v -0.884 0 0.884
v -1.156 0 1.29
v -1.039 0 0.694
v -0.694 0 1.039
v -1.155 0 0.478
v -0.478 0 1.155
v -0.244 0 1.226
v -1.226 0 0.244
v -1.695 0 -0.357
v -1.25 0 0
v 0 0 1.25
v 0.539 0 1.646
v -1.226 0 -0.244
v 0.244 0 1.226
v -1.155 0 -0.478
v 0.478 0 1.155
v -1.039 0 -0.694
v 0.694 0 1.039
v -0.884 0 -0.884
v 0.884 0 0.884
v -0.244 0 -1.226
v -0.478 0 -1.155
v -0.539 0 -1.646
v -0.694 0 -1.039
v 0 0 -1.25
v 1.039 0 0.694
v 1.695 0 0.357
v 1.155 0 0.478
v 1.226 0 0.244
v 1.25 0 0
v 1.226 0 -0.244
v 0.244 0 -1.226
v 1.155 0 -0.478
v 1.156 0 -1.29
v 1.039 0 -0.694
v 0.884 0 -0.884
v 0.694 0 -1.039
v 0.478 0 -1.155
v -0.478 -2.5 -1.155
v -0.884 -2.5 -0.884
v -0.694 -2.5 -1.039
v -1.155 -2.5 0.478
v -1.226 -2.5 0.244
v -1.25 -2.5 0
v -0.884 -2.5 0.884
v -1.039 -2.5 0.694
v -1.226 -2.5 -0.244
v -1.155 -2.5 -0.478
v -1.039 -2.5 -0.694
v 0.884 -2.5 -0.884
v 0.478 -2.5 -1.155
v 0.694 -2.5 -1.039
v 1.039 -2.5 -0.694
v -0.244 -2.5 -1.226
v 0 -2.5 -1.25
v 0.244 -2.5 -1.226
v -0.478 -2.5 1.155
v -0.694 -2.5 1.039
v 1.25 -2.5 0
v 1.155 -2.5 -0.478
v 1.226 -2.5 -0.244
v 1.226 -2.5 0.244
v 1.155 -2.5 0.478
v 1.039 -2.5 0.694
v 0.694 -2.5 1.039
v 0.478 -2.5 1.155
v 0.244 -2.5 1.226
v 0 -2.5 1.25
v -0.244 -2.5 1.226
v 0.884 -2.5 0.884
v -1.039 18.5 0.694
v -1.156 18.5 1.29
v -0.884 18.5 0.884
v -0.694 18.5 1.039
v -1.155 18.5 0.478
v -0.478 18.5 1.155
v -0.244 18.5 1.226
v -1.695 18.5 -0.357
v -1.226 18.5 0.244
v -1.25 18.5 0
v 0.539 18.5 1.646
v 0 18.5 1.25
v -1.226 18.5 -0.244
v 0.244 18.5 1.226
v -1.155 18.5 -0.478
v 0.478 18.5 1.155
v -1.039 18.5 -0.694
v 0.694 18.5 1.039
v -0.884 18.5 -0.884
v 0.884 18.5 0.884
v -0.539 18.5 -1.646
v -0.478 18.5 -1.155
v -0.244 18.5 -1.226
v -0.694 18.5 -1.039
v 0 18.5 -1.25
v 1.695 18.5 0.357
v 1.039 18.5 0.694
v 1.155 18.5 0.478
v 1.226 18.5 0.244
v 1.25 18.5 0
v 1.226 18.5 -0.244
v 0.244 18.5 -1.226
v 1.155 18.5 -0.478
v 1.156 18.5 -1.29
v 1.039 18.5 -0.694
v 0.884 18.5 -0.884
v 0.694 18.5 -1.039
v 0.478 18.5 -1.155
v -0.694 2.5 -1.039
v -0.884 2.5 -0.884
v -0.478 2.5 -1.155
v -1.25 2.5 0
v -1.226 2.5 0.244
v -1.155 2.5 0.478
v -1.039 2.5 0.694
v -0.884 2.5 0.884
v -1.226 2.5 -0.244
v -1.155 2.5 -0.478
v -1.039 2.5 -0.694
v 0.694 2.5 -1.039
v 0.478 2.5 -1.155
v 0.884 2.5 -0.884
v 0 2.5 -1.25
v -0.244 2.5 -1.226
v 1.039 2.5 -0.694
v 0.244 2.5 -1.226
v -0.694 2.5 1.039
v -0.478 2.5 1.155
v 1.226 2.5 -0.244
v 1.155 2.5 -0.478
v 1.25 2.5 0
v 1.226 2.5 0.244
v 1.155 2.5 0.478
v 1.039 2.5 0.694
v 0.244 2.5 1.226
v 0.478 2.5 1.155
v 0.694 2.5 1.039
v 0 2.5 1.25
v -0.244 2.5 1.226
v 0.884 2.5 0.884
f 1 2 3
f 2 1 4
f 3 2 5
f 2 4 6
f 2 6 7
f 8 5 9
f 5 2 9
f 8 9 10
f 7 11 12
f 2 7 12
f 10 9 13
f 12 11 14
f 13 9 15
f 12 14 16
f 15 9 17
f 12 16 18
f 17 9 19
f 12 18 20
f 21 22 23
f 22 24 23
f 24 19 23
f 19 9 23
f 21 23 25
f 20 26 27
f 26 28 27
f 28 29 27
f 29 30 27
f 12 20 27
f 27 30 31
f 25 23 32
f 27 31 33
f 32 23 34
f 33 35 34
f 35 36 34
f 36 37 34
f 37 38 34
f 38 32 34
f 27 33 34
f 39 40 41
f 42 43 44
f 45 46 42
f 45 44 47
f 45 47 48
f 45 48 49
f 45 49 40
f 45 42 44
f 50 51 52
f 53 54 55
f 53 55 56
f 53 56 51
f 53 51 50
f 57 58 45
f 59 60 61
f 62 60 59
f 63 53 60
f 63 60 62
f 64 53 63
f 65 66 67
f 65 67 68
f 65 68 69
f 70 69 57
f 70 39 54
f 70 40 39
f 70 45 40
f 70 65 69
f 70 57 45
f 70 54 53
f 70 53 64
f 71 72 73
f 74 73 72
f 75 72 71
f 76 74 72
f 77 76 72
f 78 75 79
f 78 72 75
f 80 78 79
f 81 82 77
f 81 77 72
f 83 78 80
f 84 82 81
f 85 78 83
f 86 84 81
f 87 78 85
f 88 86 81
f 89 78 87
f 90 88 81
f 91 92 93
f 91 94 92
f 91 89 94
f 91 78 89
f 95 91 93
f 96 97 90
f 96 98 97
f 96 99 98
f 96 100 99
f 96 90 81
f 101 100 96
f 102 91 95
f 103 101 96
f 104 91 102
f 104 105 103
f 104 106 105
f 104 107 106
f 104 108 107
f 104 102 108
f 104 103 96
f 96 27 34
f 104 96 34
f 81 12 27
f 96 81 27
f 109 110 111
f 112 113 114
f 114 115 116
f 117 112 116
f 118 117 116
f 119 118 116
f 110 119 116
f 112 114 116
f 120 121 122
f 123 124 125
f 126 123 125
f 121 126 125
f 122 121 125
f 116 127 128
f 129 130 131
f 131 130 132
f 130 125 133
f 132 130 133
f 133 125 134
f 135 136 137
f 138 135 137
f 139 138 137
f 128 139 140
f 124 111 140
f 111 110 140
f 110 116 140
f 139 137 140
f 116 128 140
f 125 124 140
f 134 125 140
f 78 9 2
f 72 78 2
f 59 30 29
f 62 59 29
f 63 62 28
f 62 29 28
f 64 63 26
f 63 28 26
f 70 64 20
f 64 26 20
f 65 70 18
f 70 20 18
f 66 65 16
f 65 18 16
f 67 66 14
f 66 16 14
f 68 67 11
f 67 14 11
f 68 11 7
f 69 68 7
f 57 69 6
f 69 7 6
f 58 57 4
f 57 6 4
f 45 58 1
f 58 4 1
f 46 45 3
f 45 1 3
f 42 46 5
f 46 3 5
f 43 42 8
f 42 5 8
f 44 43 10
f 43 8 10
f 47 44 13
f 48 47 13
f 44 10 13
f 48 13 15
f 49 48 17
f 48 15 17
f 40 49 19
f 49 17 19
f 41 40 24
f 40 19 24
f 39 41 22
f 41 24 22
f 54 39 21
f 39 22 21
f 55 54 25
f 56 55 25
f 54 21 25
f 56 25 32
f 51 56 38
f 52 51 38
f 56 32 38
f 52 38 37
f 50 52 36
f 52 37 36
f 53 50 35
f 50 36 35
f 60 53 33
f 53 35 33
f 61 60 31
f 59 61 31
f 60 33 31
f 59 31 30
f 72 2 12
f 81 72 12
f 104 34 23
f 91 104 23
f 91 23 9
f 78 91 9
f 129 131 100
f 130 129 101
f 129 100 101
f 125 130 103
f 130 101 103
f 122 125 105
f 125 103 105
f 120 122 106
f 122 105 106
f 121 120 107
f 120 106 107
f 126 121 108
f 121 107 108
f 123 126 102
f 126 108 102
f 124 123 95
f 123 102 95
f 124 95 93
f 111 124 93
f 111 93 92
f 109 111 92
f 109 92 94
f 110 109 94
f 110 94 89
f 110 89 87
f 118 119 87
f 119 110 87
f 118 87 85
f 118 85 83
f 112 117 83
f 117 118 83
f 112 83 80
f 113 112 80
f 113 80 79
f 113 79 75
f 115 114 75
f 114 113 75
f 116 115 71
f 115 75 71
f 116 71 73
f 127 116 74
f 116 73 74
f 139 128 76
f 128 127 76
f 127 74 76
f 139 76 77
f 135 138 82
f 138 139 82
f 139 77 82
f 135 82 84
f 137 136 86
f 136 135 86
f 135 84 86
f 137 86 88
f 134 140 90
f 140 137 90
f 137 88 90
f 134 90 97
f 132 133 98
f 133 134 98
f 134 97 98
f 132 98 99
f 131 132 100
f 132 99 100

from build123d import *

# Parameters (mm, degrees)
BOSS_EXTRUDE1_DEPTH      = 18.5
SKETCH2_R                = 1.25
CUT_EXTRUDE1_DEPTH       = 18.5
SKETCH3_R                = 1.25
BOSS_EXTRUDE2_DEPTH      = 2.5
BOSS_EXTRUDE2_DEPTH_BACK = 2.5


with BuildPart() as part:
    # Sketch1 → Boss-Extrude1 (new body)
    with BuildSketch(Plane(origin=(0, 0, 0), x_dir=(1, 0, 0), z_dir=(0, 1, 0))):
        Polygon((1.156221884, 1.289632101), (-0.538743219, 1.646133574), (-1.694965103, 0.356501473), (-1.156221884, -1.289632101), (0.538743219, -1.646133574), (1.694965103, -0.356501473), align=None)
    extrude(amount=BOSS_EXTRUDE1_DEPTH)

    # Sketch2 → Cut-Extrude1 (cut)
    with BuildSketch(Plane(origin=(0, 18.5, 0), x_dir=(1, 0, 0), z_dir=(0, 1, 0))):
        Circle(SKETCH2_R)
    extrude(amount=-CUT_EXTRUDE1_DEPTH, mode=Mode.SUBTRACT)

    # Sketch3 → Boss-Extrude2 (add, two sides)
    with BuildSketch(Plane.XZ) as boss_extrude2_sk:
        Circle(SKETCH3_R)
    extrude(amount=BOSS_EXTRUDE2_DEPTH)
    extrude(boss_extrude2_sk.sketch, amount=-BOSS_EXTRUDE2_DEPTH_BACK)


solid = part.part
